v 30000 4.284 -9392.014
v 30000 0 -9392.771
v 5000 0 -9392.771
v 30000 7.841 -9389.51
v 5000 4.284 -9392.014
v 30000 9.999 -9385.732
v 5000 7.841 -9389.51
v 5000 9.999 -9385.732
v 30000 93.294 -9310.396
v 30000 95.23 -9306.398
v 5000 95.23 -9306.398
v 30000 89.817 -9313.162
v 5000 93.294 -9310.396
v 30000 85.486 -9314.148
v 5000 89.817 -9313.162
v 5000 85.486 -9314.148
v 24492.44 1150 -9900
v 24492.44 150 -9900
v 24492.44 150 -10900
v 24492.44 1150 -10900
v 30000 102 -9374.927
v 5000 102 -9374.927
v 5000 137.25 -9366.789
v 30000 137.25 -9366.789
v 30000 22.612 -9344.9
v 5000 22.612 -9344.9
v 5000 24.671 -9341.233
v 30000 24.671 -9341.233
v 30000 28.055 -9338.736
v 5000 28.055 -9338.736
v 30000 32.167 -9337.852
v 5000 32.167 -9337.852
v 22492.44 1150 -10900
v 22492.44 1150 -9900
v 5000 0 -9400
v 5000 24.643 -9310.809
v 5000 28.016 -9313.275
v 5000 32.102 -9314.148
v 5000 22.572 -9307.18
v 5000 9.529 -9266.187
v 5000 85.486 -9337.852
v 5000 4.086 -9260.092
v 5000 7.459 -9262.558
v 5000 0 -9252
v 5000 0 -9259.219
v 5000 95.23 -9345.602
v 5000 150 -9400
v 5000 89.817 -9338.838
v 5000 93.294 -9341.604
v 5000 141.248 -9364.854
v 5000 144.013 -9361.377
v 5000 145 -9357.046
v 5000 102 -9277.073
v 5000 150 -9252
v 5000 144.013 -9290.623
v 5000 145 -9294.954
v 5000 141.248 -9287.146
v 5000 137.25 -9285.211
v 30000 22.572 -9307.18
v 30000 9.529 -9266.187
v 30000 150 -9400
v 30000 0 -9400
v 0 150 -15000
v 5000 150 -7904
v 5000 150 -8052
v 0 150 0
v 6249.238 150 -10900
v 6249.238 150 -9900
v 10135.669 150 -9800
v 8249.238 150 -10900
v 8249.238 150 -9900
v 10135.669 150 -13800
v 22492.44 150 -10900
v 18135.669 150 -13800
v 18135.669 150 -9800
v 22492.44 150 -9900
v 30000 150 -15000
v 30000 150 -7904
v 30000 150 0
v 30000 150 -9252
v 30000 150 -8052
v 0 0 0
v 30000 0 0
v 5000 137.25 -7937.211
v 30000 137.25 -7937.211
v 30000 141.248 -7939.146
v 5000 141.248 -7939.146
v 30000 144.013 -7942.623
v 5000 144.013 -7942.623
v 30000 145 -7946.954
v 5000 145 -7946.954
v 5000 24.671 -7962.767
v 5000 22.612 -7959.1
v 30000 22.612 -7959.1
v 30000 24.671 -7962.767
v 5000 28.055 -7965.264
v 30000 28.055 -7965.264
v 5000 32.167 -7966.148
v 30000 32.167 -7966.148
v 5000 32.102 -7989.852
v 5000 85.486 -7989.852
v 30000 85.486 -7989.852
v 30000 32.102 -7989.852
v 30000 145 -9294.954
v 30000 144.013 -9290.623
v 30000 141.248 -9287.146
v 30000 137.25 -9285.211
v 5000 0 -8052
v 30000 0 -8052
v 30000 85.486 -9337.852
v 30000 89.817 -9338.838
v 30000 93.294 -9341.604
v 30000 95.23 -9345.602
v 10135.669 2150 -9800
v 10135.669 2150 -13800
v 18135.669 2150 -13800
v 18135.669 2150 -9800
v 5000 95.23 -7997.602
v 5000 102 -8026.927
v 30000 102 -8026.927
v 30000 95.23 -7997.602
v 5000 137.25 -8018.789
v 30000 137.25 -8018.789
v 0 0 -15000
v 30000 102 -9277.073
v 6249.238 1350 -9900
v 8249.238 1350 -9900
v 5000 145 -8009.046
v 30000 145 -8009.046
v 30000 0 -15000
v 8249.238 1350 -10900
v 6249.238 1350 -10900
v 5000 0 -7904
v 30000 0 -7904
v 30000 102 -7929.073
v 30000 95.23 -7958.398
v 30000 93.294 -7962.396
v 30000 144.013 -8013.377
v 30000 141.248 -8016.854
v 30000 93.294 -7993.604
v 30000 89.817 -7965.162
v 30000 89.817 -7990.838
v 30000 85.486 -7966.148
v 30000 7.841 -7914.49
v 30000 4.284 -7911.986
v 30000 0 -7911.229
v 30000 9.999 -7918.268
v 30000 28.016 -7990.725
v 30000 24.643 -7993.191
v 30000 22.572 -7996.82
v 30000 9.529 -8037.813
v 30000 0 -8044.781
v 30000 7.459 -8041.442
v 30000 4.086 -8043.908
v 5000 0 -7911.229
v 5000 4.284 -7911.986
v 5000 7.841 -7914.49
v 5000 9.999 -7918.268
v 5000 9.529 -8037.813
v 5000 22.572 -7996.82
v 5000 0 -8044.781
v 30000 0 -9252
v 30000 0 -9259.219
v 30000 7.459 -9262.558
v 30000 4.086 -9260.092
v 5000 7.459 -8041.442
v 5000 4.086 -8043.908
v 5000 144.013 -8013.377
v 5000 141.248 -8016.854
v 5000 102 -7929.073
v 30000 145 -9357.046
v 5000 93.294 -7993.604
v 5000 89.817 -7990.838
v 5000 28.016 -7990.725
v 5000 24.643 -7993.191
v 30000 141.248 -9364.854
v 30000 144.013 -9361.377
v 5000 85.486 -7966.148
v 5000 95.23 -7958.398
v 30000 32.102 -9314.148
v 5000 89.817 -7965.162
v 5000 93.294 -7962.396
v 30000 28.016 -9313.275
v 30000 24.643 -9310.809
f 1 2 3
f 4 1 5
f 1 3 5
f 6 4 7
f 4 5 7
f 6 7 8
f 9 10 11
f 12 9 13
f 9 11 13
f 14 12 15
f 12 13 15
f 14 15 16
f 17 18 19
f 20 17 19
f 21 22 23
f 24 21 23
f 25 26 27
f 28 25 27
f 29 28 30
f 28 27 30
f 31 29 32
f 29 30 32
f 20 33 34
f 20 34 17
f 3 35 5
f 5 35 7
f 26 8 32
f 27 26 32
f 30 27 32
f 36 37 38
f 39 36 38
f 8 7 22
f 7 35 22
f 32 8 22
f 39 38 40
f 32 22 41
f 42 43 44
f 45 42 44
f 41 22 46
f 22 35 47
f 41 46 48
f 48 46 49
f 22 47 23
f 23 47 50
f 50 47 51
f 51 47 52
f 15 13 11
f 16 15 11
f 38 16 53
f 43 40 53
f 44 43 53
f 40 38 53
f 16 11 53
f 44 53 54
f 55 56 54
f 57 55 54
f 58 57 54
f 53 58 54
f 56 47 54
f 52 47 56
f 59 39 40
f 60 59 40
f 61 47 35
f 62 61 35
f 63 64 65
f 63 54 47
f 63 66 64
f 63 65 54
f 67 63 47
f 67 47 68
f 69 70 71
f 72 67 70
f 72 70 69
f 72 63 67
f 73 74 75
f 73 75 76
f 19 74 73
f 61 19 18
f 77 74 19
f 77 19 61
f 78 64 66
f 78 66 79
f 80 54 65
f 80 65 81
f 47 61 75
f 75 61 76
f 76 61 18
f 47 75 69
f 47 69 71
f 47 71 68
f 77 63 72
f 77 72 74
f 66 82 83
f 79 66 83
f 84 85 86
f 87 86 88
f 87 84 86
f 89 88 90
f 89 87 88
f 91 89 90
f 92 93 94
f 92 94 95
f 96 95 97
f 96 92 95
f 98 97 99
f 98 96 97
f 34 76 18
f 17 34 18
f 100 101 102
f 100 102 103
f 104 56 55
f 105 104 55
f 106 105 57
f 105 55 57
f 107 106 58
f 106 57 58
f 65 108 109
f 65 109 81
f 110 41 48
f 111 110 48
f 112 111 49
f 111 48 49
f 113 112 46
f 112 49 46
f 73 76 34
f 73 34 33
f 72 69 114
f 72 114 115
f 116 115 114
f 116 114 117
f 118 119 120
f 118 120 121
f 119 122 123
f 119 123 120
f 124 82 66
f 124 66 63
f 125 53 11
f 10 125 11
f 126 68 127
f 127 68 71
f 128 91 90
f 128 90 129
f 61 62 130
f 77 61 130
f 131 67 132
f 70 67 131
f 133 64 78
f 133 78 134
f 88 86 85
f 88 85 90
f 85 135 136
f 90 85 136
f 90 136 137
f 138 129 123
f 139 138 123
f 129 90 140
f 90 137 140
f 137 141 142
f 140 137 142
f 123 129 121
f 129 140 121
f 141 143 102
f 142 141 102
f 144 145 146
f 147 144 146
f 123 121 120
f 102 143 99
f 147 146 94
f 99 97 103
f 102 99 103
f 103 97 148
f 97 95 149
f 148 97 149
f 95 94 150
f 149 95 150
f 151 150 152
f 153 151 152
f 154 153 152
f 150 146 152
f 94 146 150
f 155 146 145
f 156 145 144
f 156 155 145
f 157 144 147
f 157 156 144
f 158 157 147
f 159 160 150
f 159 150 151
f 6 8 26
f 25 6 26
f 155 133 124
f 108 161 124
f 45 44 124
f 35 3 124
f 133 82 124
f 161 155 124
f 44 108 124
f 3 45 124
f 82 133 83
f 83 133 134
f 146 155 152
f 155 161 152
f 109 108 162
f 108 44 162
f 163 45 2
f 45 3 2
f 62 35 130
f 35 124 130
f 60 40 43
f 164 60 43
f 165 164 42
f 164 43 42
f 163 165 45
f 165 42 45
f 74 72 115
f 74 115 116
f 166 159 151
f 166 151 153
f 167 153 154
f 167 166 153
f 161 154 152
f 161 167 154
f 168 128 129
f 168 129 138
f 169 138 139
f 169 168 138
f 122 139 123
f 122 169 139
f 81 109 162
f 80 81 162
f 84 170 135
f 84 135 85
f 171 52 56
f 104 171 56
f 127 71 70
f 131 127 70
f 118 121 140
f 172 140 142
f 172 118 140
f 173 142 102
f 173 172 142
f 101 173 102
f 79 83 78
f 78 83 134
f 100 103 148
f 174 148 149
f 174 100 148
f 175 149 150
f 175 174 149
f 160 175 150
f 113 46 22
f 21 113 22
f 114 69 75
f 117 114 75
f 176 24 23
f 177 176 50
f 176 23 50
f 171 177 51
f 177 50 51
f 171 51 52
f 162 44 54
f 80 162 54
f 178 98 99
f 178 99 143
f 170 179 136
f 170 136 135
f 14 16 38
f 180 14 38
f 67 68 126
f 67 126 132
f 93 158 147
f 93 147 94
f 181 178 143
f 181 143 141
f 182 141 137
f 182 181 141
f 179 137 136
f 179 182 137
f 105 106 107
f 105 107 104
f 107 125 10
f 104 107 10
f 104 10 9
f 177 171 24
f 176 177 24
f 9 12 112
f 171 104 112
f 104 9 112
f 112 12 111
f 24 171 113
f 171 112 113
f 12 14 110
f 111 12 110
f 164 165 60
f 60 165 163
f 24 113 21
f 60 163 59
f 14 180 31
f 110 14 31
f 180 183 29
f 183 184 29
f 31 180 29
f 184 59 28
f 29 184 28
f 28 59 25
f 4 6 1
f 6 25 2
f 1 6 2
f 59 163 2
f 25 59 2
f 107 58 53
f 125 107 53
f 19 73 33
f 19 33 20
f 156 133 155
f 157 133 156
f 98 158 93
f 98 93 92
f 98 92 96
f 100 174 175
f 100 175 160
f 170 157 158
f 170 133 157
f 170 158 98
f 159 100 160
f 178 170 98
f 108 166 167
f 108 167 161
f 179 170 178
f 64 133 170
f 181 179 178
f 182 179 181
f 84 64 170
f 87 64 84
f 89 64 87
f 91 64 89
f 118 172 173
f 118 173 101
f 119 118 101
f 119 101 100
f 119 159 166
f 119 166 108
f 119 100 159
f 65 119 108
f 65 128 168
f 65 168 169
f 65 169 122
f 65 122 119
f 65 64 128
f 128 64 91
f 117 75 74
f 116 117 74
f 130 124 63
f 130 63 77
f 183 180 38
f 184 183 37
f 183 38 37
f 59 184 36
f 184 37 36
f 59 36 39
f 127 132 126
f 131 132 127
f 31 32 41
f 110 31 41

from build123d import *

# Parameters (mm, degrees)
SKETCH1_W           = 30000
SKETCH1_H           = 15000
BOSS_EXTRUDE3_DEPTH = 150
CUT_EXTRUDE1_DEPTH  = 150000
SKETCH4_W           = 2000
SKETCH4_H           = 1000
BOSS_EXTRUDE4_DEPTH = 1200
SKETCH7_W           = 2000
SKETCH7_H           = 1000
BOSS_EXTRUDE5_DEPTH = 1000
SKETCH8_W           = 8000
SKETCH8_H           = 4000
BOSS_EXTRUDE6_DEPTH = 2000


with BuildPart() as part:
    # Sketch1 → Boss-Extrude3 (new body)
    with BuildSketch(Plane(origin=(0, 0, 0), x_dir=(1, 0, 0), z_dir=(0, 1, 0))):
        with Locations((15000, 7500)):
            Rectangle(SKETCH1_W, SKETCH1_H)
    extrude(amount=BOSS_EXTRUDE3_DEPTH)

    # Sketch3 → Cut-Extrude1 (cut)
    with BuildSketch(Plane.ZY.offset(-5000)):
        with BuildLine():
            Line((-9252, 150), (-9400, 150))
            Line((-9400, 150), (-9400, 0))
            Line((-9400, 0), (-9392.770799758, 0))
            ThreePointArc((-9392.770799758, 0), (-9390.957813925, 6.200601455), (-9385.73215101, 9.998867262))
            Line((-9385.73215101, 9.998867262), (-9344.900263202, 22.612194817))
            ThreePointArc((-9344.900263202, 22.612194817), (-9339.804540817, 26.230161795), (-9337.851737232, 32.166712128))
            Line((-9337.851737232, 32.166712128), (-9337.851737232, 85.486065284))
            ThreePointArc((-9337.851737232, 85.486065284), (-9340.025655664, 91.71121165), (-9345.602226689, 95.229765932))
            Line((-9345.602226689, 95.229765932), (-9374.927332218, 102))
            Line((-9374.927332218, 102), (-9366.789341481, 137.249510543))
            ThreePointArc((-9366.789341481, 137.249510543), (-9363.2707872, 142.826081569), (-9357.045640833, 145))
            Line((-9357.045640833, 145), (-9294.954359167, 145))
            ThreePointArc((-9294.954359167, 145), (-9288.7292128, 142.826081569), (-9285.210658519, 137.249510543))
            Line((-9285.210658519, 137.249510543), (-9277.072667782, 102))
            Line((-9277.072667782, 102), (-9306.397773311, 95.229765932))
            ThreePointArc((-9306.397773311, 95.229765932), (-9311.974344336, 91.71121165), (-9314.148262768, 85.486065284))
            Line((-9314.148262768, 85.486065284), (-9314.148262768, 32.101727948))
            ThreePointArc((-9314.148262768, 32.101727948), (-9312.220447279, 26.199199912), (-9307.180295324, 22.57246887))
            Line((-9307.180295324, 22.57246887), (-9266.187290464, 9.529259078))
            ThreePointArc((-9266.187290464, 9.529259078), (-9261.147138509, 5.902528036), (-9259.21932302, 0))
            Line((-9259.21932302, 0), (-9252, 0))
            Line((-9252, 0), (-9252, 150))
        make_face()
    cut_extrude1 = extrude(amount=-CUT_EXTRUDE1_DEPTH, mode=Mode.SUBTRACT)

    # Mirror1: Cut-Extrude1 across plane
    add(cut_extrude1.mirror(Plane.XY.offset(-8652)), mode=Mode.SUBTRACT)

    # Sketch4 → Boss-Extrude4 (add)
    with BuildSketch(Plane(origin=(0, 150, 0), x_dir=(1, 0, 0), z_dir=(0, 1, 0))):
        with Locations((7249.238259699, 10400)):
            Rectangle(SKETCH4_W, SKETCH4_H)
    extrude(amount=BOSS_EXTRUDE4_DEPTH)

    # Sketch7 → Boss-Extrude5 (add)
    with BuildSketch(Plane(origin=(0, 150, 0), x_dir=(1, 0, 0), z_dir=(0, 1, 0))):
        with Locations((23492.439527583, 10400)):
            Rectangle(SKETCH7_W, SKETCH7_H)
    extrude(amount=BOSS_EXTRUDE5_DEPTH)

    # Sketch8 → Boss-Extrude6 (add)
    with BuildSketch(Plane(origin=(0, 150, 0), x_dir=(1, 0, 0), z_dir=(0, 1, 0))):
        with Locations((14135.668801115, 11800)):
            Rectangle(SKETCH8_W, SKETCH8_H)
    extrude(amount=BOSS_EXTRUDE6_DEPTH)


solid = part.part
